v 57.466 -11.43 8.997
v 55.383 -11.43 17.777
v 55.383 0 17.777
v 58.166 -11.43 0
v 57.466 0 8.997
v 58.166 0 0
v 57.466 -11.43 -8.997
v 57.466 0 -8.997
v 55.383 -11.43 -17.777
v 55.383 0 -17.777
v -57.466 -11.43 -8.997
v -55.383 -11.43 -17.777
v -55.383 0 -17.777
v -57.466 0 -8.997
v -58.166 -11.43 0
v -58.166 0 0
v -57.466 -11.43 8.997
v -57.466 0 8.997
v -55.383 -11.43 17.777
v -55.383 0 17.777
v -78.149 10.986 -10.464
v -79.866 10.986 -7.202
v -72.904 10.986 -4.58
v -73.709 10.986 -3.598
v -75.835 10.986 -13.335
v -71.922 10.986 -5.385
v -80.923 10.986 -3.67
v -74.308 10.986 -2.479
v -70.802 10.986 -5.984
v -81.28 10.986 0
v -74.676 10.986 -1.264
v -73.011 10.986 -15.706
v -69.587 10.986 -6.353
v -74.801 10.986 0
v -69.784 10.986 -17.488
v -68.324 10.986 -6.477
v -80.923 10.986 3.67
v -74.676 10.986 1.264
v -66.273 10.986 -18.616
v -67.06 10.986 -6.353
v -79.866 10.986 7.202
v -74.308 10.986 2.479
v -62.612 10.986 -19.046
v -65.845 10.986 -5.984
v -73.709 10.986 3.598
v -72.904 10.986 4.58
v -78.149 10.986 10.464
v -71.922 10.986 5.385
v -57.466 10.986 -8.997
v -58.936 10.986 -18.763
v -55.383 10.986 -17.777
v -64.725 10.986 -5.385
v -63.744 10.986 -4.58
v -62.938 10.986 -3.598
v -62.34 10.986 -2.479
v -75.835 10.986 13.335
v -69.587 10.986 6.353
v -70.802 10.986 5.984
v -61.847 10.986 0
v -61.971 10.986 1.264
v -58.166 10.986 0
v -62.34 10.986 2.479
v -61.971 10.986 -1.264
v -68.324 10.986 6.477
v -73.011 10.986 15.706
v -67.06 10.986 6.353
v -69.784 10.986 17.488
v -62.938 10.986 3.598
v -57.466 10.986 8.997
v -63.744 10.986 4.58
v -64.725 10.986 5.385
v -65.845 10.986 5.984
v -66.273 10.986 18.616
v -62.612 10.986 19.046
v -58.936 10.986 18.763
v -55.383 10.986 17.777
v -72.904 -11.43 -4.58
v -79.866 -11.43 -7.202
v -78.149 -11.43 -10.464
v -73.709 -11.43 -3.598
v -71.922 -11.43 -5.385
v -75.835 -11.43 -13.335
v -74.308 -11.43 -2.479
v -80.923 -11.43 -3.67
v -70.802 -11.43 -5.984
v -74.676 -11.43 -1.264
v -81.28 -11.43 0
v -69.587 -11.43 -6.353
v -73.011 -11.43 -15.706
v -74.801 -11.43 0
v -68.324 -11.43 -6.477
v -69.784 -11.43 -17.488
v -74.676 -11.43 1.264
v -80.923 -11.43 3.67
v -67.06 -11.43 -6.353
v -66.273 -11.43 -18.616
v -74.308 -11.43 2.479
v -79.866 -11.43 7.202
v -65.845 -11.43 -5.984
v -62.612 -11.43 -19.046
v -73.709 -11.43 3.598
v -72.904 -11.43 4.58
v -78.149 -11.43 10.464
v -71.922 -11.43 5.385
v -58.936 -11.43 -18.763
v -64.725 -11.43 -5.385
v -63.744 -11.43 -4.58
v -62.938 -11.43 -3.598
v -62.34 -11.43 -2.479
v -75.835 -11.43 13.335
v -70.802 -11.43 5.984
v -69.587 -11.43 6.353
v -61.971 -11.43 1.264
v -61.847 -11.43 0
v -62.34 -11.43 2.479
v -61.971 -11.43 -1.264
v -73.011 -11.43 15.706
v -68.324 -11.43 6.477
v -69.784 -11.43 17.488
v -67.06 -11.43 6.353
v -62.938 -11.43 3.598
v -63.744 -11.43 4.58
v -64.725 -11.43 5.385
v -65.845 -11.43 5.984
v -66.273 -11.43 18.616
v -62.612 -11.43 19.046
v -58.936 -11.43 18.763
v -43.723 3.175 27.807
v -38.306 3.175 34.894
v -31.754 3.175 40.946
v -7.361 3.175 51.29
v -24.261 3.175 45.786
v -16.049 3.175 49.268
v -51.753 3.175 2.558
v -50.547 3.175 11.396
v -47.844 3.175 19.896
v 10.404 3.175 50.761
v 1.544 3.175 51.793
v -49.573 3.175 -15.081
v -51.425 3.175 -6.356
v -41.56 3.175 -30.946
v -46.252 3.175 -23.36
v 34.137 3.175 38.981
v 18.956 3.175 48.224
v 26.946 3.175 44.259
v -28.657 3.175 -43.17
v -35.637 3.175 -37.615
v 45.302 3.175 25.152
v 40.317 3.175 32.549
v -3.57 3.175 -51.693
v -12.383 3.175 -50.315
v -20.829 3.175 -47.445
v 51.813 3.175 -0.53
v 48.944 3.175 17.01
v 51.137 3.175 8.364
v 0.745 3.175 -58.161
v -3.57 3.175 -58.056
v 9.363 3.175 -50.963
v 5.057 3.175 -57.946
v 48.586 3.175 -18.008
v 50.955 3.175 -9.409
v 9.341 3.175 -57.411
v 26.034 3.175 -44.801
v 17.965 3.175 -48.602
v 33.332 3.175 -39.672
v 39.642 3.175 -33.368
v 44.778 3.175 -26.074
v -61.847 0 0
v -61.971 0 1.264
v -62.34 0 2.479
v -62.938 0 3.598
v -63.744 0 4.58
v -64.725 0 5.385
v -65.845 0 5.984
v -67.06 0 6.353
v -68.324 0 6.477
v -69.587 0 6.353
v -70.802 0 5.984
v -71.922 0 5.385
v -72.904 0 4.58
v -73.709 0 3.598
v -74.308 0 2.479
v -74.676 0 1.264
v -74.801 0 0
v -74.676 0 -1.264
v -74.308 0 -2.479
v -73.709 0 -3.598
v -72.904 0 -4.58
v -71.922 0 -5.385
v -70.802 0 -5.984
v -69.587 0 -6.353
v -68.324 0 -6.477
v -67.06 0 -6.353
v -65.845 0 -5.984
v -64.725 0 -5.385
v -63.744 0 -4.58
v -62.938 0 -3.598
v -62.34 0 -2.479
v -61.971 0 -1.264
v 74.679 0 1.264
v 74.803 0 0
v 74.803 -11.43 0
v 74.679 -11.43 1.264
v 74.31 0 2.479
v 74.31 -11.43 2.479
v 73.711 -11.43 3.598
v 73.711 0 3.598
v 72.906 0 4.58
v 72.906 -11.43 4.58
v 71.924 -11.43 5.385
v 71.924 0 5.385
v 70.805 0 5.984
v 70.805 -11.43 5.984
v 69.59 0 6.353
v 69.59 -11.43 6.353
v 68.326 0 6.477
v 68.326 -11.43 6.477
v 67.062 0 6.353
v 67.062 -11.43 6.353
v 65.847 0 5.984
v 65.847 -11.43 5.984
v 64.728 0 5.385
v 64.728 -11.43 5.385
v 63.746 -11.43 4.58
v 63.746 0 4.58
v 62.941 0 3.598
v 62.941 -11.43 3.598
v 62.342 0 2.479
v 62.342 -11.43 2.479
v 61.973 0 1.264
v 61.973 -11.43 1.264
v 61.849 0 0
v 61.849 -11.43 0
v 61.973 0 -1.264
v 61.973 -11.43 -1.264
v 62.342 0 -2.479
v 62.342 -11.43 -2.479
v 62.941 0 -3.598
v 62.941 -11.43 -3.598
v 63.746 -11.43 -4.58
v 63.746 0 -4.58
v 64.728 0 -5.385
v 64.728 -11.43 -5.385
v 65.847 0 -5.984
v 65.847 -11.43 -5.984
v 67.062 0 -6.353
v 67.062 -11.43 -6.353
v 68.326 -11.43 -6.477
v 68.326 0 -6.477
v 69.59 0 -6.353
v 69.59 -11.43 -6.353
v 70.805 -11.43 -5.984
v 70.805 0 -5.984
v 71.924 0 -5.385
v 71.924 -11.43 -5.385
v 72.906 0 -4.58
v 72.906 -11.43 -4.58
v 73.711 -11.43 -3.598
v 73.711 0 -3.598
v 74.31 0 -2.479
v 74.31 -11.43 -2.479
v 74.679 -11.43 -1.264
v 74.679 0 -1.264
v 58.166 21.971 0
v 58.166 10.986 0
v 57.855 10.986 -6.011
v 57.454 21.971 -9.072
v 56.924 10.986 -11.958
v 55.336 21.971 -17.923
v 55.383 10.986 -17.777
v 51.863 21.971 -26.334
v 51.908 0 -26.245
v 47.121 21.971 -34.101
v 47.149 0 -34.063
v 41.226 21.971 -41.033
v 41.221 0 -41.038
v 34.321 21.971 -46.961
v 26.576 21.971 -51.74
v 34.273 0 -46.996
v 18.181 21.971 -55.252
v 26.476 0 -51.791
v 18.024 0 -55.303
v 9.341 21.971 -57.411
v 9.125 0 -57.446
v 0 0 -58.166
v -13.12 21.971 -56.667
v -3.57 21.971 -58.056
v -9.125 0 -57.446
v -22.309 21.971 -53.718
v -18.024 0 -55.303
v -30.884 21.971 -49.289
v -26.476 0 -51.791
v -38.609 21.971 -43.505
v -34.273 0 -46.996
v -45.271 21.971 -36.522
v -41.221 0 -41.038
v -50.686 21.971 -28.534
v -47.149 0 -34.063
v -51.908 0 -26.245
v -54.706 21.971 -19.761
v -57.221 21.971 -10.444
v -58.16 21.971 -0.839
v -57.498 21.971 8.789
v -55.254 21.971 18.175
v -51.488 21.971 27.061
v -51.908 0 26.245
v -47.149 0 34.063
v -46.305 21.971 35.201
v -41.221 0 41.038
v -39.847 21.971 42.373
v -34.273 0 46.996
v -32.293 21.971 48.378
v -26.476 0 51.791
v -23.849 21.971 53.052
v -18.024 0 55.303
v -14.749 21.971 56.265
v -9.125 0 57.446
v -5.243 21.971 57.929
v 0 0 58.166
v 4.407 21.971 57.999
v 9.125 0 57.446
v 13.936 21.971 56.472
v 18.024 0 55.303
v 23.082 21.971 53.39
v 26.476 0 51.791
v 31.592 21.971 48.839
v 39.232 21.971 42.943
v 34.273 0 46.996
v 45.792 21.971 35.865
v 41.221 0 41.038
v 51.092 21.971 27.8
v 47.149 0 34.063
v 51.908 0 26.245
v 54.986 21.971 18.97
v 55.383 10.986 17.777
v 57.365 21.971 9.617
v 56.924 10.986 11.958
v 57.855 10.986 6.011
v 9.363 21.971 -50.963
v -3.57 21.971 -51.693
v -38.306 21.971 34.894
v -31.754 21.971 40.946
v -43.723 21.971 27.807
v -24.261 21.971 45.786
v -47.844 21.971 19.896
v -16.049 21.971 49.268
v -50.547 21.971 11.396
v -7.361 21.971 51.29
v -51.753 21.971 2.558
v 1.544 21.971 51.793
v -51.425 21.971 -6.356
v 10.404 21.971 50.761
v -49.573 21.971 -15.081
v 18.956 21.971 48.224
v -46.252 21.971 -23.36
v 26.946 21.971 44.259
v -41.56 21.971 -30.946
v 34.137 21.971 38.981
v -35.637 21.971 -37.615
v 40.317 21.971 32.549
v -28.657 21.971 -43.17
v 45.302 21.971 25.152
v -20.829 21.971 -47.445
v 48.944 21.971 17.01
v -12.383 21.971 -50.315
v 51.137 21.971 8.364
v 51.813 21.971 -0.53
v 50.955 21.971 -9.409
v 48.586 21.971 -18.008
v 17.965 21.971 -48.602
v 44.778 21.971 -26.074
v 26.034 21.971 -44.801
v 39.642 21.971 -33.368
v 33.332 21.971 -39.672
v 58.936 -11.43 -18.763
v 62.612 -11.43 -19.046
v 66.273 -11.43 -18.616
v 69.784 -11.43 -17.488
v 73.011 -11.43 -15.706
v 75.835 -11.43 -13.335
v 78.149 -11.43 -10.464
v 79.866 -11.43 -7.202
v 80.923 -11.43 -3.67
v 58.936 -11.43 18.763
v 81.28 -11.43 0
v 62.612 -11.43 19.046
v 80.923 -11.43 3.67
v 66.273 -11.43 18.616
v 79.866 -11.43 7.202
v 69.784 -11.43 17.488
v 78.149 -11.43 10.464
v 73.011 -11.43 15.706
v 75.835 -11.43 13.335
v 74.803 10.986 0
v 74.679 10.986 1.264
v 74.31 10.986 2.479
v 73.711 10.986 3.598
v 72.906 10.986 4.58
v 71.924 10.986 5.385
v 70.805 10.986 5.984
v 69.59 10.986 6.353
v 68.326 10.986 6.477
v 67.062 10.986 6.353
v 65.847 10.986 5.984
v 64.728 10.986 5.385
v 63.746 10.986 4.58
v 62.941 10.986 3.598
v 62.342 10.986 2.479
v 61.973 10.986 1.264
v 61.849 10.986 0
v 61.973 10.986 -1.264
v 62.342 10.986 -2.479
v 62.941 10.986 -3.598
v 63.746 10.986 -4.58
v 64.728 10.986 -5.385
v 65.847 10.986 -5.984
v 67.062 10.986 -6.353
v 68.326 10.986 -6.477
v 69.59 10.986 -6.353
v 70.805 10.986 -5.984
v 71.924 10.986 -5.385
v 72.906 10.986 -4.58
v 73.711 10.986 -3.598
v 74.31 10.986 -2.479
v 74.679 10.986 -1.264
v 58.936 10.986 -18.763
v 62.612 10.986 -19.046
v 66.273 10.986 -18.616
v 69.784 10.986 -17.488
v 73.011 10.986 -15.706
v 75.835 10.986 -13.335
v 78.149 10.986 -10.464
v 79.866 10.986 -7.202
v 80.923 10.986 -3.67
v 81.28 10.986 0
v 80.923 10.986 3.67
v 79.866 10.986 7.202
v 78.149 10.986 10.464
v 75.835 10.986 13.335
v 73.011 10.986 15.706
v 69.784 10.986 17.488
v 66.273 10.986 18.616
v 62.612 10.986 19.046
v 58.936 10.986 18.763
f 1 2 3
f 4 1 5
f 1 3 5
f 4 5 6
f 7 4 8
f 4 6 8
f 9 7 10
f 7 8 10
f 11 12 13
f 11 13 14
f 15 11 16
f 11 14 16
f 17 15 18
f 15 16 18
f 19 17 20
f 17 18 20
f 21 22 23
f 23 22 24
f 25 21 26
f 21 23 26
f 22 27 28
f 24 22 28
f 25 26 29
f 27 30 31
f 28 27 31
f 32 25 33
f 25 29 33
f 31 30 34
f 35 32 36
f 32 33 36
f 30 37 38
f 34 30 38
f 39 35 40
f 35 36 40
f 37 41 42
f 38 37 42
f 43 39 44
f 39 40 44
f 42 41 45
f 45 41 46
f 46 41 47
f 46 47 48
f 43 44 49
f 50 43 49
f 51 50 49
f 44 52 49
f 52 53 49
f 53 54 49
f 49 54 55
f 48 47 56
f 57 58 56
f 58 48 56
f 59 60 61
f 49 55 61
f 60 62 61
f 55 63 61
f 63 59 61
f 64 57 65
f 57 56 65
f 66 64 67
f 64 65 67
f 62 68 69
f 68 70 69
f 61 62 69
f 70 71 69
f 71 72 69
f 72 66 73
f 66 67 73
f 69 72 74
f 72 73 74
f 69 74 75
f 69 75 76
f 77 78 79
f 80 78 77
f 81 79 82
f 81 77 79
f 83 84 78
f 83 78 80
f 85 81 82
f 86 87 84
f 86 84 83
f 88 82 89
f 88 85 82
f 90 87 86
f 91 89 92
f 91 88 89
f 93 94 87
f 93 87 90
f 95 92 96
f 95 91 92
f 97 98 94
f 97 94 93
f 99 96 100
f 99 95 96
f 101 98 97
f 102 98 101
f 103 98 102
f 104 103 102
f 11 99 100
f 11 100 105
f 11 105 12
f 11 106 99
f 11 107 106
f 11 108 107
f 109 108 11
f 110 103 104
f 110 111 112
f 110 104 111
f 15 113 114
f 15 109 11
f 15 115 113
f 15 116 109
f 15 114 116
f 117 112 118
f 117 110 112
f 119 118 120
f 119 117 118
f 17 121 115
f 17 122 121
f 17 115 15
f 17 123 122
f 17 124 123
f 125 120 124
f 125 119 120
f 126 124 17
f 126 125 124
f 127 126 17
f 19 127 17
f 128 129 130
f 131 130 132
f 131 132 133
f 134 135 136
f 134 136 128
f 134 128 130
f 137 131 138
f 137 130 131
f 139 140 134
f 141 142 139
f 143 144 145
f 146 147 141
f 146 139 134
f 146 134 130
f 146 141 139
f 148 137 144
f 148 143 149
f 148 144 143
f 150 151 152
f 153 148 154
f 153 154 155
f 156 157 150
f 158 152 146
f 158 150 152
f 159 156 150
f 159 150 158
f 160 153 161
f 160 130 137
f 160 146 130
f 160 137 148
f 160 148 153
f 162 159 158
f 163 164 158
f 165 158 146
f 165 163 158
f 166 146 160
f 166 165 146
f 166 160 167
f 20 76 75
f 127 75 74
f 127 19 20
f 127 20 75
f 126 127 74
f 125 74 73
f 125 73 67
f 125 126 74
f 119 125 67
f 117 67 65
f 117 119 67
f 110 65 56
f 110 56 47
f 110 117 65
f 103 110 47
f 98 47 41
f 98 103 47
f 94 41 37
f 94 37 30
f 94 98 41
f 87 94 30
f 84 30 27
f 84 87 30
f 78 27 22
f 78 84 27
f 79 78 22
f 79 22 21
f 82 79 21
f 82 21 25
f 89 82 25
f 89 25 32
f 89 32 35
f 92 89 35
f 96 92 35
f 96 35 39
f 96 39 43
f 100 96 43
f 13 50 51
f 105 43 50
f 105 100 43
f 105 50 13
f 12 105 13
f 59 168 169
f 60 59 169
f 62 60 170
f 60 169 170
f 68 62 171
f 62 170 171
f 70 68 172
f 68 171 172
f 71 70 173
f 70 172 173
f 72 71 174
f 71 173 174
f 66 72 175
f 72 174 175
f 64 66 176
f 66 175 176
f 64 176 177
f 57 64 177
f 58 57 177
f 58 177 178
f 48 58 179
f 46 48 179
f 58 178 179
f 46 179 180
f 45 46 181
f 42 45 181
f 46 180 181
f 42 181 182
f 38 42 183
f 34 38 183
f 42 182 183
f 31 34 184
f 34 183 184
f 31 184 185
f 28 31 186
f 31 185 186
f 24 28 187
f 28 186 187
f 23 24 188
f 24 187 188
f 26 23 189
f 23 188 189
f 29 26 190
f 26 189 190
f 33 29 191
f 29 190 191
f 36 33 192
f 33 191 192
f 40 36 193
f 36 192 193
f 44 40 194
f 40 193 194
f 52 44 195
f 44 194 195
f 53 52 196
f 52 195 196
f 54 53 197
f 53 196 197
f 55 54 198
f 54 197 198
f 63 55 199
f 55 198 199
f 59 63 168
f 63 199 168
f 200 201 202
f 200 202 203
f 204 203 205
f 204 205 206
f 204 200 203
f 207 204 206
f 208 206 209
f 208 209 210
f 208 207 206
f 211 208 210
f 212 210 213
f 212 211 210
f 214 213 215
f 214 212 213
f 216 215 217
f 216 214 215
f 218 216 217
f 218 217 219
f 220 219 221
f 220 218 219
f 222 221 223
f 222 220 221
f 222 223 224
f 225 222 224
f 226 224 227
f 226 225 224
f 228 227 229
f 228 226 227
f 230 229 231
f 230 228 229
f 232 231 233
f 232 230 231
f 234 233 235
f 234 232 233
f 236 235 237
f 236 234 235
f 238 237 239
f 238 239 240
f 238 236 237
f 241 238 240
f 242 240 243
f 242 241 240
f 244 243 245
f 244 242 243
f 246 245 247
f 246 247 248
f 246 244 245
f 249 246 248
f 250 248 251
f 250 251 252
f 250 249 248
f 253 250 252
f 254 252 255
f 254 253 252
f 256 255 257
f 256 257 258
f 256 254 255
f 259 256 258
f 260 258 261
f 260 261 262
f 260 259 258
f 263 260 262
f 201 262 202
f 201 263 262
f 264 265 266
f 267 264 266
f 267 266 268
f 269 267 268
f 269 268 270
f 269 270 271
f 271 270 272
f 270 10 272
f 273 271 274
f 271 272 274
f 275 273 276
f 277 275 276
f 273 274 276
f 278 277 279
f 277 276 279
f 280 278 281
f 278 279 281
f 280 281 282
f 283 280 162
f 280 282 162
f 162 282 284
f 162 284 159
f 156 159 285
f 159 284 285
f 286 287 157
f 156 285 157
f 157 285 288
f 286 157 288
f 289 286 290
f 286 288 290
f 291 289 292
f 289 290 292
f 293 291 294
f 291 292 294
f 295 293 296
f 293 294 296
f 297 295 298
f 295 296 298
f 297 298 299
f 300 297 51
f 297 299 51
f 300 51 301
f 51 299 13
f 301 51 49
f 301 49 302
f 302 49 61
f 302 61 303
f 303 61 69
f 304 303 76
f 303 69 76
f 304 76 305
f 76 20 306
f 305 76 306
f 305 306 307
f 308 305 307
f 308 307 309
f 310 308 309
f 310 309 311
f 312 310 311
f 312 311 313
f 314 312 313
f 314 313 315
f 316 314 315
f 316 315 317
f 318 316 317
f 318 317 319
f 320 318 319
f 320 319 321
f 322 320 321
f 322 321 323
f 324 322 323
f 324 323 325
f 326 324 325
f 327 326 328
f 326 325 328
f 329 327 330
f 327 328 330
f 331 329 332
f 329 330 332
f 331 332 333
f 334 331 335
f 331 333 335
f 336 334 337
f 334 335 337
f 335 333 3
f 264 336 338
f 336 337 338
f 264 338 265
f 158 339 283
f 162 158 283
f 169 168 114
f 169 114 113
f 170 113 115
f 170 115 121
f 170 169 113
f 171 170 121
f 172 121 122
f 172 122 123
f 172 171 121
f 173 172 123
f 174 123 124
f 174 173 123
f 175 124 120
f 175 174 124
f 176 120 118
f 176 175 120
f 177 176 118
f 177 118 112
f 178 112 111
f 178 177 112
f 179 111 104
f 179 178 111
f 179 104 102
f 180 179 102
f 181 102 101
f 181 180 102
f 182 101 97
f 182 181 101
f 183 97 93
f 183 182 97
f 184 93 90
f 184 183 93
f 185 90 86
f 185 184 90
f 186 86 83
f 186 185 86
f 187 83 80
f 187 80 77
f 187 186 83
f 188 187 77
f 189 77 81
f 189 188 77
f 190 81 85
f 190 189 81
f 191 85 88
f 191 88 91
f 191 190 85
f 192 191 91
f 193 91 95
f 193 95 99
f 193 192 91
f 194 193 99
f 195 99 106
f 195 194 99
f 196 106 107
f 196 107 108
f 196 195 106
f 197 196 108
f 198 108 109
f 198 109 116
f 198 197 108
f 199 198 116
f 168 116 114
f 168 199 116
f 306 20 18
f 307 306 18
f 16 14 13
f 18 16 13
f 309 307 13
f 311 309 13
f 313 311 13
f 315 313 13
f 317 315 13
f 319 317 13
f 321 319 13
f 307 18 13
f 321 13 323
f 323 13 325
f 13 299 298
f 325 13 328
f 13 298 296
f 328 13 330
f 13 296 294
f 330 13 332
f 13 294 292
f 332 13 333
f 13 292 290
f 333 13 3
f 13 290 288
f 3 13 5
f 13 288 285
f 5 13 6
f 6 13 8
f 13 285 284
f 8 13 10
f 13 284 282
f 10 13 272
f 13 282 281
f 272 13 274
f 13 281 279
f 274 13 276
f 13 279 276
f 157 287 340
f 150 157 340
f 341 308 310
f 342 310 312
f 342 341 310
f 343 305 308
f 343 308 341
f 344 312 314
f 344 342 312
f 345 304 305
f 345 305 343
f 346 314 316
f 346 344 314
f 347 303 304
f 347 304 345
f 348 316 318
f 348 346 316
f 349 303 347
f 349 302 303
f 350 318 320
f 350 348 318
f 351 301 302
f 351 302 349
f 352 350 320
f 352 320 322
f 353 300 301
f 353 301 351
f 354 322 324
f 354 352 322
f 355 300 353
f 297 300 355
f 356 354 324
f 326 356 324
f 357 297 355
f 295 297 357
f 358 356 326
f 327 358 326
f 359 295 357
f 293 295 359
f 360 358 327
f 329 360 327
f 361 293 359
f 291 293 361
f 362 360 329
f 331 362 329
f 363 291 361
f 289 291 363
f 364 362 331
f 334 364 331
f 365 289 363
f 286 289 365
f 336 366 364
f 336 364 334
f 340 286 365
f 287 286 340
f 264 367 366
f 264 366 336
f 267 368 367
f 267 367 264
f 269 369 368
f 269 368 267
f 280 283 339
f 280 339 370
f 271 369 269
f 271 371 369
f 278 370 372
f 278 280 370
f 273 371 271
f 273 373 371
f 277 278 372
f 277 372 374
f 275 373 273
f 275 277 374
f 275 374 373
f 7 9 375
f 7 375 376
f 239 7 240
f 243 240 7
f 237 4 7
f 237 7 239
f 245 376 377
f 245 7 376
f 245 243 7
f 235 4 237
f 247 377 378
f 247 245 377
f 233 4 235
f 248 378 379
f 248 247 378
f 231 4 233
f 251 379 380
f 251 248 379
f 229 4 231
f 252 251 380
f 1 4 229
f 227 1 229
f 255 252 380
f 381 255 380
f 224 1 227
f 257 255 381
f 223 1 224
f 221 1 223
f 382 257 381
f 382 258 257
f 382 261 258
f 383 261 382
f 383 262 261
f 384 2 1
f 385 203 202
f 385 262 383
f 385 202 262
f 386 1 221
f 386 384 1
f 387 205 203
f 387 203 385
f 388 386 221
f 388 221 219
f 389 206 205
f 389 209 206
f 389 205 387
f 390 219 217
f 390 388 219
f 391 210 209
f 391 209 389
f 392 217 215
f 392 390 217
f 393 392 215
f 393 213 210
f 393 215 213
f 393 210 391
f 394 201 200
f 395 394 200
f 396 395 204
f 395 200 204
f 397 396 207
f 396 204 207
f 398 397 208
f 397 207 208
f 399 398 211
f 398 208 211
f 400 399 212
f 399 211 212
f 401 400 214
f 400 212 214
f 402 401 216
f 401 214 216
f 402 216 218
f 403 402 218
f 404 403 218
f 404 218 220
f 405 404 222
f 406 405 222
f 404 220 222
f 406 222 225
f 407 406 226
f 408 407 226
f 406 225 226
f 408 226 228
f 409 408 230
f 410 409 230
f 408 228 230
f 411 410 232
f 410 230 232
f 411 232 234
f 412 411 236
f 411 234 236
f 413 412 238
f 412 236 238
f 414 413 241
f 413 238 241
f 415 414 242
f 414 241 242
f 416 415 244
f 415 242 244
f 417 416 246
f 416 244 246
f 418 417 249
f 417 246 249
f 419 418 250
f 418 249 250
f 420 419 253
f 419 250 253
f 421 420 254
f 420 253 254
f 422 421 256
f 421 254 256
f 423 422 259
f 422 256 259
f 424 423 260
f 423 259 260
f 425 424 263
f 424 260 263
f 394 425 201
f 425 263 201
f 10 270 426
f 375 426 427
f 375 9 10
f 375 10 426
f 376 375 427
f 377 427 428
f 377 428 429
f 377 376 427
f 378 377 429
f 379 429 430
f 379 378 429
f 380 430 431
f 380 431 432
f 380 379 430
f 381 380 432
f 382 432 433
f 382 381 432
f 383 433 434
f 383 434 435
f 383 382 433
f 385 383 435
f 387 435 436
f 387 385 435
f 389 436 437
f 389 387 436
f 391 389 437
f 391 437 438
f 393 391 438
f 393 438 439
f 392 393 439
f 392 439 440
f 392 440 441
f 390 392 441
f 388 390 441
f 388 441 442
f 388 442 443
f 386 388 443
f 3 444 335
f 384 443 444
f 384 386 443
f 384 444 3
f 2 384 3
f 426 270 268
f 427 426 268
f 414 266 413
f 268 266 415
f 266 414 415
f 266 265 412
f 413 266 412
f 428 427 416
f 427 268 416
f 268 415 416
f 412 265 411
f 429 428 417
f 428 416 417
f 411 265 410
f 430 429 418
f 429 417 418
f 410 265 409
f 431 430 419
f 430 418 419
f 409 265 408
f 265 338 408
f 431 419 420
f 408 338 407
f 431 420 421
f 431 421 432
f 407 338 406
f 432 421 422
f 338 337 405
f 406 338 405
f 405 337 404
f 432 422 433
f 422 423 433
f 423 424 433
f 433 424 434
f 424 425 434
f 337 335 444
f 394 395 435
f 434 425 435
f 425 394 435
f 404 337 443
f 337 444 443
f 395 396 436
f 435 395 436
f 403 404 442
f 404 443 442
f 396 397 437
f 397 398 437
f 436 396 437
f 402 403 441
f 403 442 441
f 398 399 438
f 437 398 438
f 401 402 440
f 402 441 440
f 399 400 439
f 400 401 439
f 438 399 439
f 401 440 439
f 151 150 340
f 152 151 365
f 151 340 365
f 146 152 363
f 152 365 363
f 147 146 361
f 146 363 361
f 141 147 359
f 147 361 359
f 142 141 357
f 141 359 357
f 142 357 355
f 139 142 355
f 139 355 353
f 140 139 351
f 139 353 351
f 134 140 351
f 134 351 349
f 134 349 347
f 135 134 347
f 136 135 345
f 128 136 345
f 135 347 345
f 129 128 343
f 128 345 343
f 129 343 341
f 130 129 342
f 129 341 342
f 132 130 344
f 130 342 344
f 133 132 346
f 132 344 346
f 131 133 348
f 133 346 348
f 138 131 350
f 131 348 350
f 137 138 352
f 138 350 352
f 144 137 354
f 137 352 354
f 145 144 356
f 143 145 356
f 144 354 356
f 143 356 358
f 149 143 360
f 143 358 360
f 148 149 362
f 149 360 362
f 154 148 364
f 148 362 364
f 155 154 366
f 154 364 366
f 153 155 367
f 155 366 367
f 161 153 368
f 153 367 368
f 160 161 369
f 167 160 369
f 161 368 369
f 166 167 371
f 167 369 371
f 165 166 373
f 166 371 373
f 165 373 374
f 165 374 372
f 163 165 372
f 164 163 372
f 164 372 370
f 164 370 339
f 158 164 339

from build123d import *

# Parameters (mm, degrees)
SKETCH1_R                = 58.166
BOSS_EXTRUDE1_DEPTH      = 21.971
SKETCH3_R                = 51.816
CUT_EXTRUDE2_DEPTH       = 18.796
CUT_EXTRUDE7_DEPTH       = 18.796
SKETCH7_R                = 6.477
BOSS_EXTRUDE3_DEPTH      = 11.43
BOSS_EXTRUDE3_DEPTH_BACK = 10.9855


with BuildPart() as part:
    # Sketch1 → Boss-Extrude1 (new body)
    with BuildSketch(Plane(origin=(0, 0, 0), x_dir=(1, 0, 0), z_dir=(0, 1, 0))):
        Circle(SKETCH1_R)
    extrude(amount=BOSS_EXTRUDE1_DEPTH)

    # Sketch3 → Cut-Extrude2 (cut)
    with BuildSketch(Plane(origin=(0, 21.971, 0), x_dir=(1, 0, 0), z_dir=(0, 1, 0))):
        Circle(SKETCH3_R)
    extrude(amount=-CUT_EXTRUDE2_DEPTH, mode=Mode.SUBTRACT)

    # Sketch6 → Cut-Extrude7 (cut)
    with BuildSketch(Plane(origin=(0, 21.971, 0), x_dir=(1, 0, 0), z_dir=(0, 1, 0))):
        with BuildLine():
            Line((9.363048829, 50.963037318), (9.340756891, 57.411094892))
            ThreePointArc((9.340756891, 57.411094892), (2.903170649, 58.093503563), (-3.57037671, 58.056317194))
            Line((-3.57037671, 58.056317194), (-3.57037671, 51.692845406))
            ThreePointArc((-3.57037671, 51.692845406), (2.919232353, 51.733702153), (9.363048829, 50.963037318))
        make_face()
    extrude(amount=-CUT_EXTRUDE7_DEPTH, mode=Mode.SUBTRACT)

    # Sketch7 → Boss-Extrude3 (add, two sides)
    with BuildSketch(Plane.XZ) as boss_extrude3_sk:
        with BuildLine():
            ThreePointArc((55.382885714, -17.776938037), (81.28, 0), (55.382885714, 17.776938037))
            ThreePointArc((55.382885714, 17.776938037), (58.166, 0), (55.382885714, -17.776938037))
        make_face()
        with Locations((68.326, 0)):
            Circle(SKETCH7_R, mode=Mode.SUBTRACT)
        with BuildLine():
            ThreePointArc((-55.382885714, 17.776938037), (-81.28, 0), (-55.382885714, -17.776938037))
            ThreePointArc((-55.382885714, -17.776938037), (-58.166, 0), (-55.382885714, 17.776938037))
        make_face()
        with Locations((-68.323824172, 0)):
            Circle(SKETCH7_R, mode=Mode.SUBTRACT)
    extrude(amount=BOSS_EXTRUDE3_DEPTH)
    extrude(boss_extrude3_sk.sketch, amount=-BOSS_EXTRUDE3_DEPTH_BACK)


solid = part.part
